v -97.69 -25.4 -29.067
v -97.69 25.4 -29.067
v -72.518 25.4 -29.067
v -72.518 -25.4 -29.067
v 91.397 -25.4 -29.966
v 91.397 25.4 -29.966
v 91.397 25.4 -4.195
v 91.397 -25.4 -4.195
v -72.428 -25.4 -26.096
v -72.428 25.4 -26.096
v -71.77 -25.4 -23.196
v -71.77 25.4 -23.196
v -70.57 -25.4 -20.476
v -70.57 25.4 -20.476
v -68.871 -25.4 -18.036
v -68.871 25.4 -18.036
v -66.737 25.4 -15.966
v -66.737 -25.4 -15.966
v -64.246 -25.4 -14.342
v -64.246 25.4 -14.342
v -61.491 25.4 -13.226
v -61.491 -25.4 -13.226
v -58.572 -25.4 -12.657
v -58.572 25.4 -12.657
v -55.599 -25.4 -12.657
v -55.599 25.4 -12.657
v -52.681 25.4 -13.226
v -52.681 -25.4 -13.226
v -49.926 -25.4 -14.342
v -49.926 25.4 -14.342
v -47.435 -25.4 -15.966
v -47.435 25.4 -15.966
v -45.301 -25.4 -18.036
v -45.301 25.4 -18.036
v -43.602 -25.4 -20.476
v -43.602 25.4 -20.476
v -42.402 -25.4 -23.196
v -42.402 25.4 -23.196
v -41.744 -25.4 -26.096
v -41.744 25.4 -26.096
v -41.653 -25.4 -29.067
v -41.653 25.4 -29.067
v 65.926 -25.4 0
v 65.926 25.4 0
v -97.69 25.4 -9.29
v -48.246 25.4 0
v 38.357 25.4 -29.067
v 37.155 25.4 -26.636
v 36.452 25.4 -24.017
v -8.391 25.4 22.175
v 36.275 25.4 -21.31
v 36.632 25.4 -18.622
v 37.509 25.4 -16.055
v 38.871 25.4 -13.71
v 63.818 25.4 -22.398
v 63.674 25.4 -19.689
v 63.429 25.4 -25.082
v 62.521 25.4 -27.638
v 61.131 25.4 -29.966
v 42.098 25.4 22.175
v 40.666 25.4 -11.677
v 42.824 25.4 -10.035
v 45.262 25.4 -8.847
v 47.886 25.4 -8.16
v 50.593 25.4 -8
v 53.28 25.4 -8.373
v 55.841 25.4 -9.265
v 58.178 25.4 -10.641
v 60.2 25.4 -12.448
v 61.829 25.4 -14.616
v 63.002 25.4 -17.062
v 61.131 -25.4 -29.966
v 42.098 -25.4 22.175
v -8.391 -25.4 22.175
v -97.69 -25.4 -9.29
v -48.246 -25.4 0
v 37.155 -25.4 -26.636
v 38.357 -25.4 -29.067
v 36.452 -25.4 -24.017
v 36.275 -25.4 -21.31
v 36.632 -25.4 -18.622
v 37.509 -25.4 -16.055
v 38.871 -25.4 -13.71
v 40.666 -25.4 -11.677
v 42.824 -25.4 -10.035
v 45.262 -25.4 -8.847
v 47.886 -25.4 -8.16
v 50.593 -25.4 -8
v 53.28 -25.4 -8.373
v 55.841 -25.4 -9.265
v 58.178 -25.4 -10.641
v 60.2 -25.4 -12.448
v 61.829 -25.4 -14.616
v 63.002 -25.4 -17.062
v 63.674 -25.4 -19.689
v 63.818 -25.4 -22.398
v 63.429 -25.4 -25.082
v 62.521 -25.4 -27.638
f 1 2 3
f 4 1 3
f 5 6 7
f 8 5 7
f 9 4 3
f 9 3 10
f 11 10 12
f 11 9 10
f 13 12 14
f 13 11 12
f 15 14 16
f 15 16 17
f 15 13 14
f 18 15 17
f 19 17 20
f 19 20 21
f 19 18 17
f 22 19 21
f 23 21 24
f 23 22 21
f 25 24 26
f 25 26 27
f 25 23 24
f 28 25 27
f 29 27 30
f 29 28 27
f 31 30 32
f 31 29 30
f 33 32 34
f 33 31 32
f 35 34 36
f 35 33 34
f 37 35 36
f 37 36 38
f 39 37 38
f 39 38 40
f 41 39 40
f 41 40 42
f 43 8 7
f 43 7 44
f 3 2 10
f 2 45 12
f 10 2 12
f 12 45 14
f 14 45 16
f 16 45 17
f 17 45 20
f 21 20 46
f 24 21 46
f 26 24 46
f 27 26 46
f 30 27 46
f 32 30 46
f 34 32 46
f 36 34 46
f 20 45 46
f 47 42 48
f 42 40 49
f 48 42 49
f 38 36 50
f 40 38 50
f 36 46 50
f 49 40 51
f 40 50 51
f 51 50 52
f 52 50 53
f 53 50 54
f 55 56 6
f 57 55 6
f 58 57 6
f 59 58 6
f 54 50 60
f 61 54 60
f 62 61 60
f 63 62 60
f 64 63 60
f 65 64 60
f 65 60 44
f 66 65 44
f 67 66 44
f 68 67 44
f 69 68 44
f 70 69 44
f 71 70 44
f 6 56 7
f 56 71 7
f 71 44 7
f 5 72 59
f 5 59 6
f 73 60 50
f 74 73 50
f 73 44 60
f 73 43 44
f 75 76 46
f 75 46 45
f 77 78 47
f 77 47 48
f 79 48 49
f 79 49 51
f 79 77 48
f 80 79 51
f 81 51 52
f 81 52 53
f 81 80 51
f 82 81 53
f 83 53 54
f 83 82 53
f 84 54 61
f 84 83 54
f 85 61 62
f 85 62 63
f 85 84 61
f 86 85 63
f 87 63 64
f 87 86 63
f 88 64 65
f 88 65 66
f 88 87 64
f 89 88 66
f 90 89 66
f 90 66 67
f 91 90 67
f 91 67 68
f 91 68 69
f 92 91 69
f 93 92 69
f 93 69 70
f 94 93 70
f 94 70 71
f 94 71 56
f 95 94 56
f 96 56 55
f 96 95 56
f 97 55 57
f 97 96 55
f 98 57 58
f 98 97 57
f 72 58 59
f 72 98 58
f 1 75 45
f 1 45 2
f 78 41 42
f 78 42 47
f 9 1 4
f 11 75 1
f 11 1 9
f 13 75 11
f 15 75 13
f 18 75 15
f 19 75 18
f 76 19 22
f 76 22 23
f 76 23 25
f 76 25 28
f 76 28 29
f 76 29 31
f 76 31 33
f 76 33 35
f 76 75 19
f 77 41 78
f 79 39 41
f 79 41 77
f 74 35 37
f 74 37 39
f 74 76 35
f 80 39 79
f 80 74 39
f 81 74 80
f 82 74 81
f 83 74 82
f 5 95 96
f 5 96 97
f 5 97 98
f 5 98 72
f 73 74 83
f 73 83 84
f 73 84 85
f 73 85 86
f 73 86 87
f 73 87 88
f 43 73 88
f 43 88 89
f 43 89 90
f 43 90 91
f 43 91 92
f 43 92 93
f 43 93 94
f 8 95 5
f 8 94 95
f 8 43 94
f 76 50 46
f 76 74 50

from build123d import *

# Parameters (mm, degrees)
F1_DEPTH      = 25.4
F1_DEPTH_BACK = 25.4


with BuildPart() as f1:
    # F0 (on Front) → F1 (new body, two sides)
    with BuildSketch(Plane.XZ) as f1_sk:
        with BuildLine():
            Line((-8.390563, 22.175057), (-48.245732, 0))
            Line((-48.245732, 0), (-97.690113, -9.289551))
            Line((-97.690113, -9.289551), (-97.690113, -29.067304))
            Line((-97.690113, -29.067304), (-72.518431, -29.067304))
            ThreePointArc((-72.518431, -29.067304), (-57.08579, -12.585117), (-41.653149, -29.067304))
            Line((-41.653149, -29.067304), (38.356856, -29.067304))
            ThreePointArc((38.356856, -29.067304), (50.593399, -7.999803), (61.131231, -29.966293))
            Line((61.131231, -29.966293), (91.397189, -29.966293))
            Line((91.397189, -29.966293), (91.397189, -4.195281))
            Line((91.397189, -4.195281), (65.925851, 0))
            Line((65.925851, 0), (42.098479, 22.175057))
            Line((42.098479, 22.175057), (-8.390563, 22.175057))
        make_face()
    extrude(amount=F1_DEPTH)
    extrude(f1_sk.sketch, amount=-F1_DEPTH_BACK)


solid = f1.part
